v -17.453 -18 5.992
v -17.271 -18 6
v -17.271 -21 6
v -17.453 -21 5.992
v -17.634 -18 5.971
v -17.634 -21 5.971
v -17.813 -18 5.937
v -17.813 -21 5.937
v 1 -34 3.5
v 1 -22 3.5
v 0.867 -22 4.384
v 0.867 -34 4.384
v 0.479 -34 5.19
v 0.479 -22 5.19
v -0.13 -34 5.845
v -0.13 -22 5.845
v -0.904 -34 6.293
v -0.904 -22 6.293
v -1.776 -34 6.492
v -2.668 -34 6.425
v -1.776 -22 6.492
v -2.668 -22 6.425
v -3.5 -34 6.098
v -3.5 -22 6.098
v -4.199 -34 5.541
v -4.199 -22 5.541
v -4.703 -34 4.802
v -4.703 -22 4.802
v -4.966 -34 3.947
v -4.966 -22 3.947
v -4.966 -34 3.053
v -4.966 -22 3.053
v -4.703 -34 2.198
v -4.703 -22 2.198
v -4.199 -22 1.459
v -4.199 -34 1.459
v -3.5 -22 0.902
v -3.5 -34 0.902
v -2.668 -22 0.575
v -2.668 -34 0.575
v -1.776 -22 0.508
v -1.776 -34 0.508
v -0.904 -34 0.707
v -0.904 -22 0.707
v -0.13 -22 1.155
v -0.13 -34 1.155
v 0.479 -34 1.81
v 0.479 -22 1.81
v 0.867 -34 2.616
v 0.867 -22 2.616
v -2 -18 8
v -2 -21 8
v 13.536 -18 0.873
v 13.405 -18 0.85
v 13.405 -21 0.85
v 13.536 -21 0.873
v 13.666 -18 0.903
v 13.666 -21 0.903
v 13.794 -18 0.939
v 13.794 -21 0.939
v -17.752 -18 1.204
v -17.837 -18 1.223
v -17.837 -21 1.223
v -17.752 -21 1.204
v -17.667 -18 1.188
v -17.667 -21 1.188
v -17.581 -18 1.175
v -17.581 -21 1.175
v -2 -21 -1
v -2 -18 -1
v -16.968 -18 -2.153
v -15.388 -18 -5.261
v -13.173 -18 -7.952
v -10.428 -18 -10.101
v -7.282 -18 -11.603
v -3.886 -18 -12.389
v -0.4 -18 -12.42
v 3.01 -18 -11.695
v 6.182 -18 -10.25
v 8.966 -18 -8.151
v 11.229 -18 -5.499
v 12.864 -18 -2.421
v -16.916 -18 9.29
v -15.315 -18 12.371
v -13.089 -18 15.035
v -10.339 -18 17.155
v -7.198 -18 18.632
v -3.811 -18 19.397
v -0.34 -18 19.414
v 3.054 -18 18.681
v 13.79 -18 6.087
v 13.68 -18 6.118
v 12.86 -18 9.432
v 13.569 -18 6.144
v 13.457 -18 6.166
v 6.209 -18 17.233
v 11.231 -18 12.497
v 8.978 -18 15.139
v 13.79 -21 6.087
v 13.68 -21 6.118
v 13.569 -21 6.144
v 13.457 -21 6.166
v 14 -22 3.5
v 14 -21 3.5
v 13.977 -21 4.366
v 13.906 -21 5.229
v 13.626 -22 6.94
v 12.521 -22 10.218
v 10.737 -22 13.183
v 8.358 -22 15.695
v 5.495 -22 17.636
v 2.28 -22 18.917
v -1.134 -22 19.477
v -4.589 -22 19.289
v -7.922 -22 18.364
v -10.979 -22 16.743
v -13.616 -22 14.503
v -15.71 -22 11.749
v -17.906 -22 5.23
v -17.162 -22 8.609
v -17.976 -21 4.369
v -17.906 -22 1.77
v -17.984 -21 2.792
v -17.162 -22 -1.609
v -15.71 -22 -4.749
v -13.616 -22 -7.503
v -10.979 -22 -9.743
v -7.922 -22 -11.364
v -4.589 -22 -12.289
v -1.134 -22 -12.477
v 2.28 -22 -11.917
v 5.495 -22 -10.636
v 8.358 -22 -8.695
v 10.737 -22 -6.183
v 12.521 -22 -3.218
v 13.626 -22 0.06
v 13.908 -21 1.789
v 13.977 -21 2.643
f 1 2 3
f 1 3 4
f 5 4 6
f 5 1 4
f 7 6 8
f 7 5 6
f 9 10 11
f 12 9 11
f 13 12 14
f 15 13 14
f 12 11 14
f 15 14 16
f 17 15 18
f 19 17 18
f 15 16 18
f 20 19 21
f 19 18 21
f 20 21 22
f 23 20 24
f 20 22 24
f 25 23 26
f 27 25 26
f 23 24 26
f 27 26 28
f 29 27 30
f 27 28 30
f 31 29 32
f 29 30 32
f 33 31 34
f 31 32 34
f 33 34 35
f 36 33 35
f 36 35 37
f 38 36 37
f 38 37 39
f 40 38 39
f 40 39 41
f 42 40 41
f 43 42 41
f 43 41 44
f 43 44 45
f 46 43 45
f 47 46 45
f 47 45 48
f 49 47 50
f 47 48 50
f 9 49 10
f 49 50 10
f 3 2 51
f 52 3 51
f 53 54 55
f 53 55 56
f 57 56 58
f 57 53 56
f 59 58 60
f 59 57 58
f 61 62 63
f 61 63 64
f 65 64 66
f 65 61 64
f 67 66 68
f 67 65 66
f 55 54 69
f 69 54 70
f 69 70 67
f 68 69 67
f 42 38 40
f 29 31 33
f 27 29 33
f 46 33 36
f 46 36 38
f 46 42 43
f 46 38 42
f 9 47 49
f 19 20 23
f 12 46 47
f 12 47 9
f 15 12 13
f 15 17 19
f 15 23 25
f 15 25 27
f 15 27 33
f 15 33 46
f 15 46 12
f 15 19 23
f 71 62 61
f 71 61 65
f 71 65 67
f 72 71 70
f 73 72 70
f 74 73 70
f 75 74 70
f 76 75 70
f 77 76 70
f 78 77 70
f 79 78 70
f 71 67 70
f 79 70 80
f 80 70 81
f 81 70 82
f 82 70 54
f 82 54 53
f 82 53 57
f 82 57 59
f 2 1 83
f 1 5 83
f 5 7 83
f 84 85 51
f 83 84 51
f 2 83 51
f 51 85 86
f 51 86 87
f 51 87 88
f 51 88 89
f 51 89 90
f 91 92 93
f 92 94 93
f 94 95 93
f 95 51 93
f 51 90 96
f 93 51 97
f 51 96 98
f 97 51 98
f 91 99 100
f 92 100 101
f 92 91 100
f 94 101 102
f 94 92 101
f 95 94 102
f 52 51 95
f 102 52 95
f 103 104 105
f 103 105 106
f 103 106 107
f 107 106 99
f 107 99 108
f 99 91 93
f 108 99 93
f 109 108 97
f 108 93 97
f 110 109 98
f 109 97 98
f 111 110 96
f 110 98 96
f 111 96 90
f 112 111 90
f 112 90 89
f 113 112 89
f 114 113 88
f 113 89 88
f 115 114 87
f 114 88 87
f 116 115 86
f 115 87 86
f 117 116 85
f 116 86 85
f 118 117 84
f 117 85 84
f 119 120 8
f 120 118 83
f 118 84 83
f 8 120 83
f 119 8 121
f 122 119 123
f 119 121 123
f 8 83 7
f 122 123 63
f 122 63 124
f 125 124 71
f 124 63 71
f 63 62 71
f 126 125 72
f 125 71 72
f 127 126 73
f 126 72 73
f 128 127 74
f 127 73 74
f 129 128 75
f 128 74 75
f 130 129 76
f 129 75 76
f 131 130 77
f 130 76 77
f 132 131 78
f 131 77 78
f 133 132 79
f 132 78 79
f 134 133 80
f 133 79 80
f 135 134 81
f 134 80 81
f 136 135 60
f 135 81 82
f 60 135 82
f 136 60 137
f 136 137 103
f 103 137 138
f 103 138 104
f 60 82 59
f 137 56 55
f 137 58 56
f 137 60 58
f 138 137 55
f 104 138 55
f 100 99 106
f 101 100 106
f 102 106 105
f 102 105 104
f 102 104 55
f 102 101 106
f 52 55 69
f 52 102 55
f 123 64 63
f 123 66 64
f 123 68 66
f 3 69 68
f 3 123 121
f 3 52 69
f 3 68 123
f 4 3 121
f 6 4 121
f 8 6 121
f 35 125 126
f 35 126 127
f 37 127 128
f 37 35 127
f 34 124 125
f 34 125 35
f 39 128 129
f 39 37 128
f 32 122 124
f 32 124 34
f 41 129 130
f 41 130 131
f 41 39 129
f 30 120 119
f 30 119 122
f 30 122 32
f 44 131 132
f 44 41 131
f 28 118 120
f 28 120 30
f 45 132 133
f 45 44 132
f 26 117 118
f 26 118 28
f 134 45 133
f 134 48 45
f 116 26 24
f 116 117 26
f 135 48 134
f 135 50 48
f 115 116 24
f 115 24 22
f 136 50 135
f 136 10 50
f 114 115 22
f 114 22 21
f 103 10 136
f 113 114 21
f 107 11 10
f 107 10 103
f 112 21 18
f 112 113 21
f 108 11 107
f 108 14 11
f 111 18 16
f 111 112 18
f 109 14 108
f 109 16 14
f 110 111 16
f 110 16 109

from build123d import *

# Parameters (mm, degrees)
CYLINDER031_R          = 3
CYLINDER031_DEPTH      = 12
CYLINDER031_ROLL_ANGLE = 90
PAD018_DEPTH           = 3
CYLINDER032_R          = 16
CYLINDER032_DEPTH      = 4
CYLINDER032_ROLL_ANGLE = 90


with BuildPart() as cylinder022_holder_axis:
    # Cylinder031 → Cylinder031 (new body)
    with BuildSketch(Plane.XY):
        Circle(CYLINDER031_R)
    extrude(amount=CYLINDER031_DEPTH)


with BuildPart() as cylinder022_holder_axis_1:
    # Cylinder031 roll: moved
    add(cylinder022_holder_axis.part.rotate(Axis((0, 0, 0), (1, 0, 0)), CYLINDER031_ROLL_ANGLE))


with BuildPart() as cylinder022_holder_axis_2:
    # Cylinder031 placement: moved
    add(cylinder022_holder_axis_1.part.moved(Location((-2, -22, 3.5))))


with BuildPart() as pad018:
    # Sketch015 → Pad018 (new body)
    with BuildSketch(Plane.XZ.offset(18)):
        with BuildLine():
            Line((-17.270868, 6), (-2, 8))
            Line((-2, 8), (13.457036, 6.165845))
            ThreePointArc((13.404874, 0.850143), (15.692563, 3.485802), (13.457036, 6.165845))
            Line((13.404874, 0.850143), (-2, -1))
            Line((-2, -1), (-17.581, 1.174724))
            ThreePointArc((-17.270868, 6), (-19.680526, 3.73227), (-17.581, 1.174724))
        make_face()
    extrude(amount=PAD018_DEPTH)


with BuildPart() as camera_rotor:
    # Cylinder032 → Cylinder032 (new body)
    with BuildSketch(Plane.XY):
        Circle(CYLINDER032_R)
    extrude(amount=CYLINDER032_DEPTH)


with BuildPart() as camera_rotor_1:
    # Cylinder032 roll: moved
    add(camera_rotor.part.rotate(Axis((0, 0, 0), (1, 0, 0)), CYLINDER032_ROLL_ANGLE))


with BuildPart() as camera_rotor_2:
    # Cylinder032 placement: moved
    add(camera_rotor_1.part.moved(Location((-2, -18, 3.5))))

    # Cut006: cut Pad018
    add(pad018.part, mode=Mode.SUBTRACT)

    # Fusion004: union Cylinder022-holder-axis
    add(cylinder022_holder_axis_2.part)


solid = camera_rotor_2.part
